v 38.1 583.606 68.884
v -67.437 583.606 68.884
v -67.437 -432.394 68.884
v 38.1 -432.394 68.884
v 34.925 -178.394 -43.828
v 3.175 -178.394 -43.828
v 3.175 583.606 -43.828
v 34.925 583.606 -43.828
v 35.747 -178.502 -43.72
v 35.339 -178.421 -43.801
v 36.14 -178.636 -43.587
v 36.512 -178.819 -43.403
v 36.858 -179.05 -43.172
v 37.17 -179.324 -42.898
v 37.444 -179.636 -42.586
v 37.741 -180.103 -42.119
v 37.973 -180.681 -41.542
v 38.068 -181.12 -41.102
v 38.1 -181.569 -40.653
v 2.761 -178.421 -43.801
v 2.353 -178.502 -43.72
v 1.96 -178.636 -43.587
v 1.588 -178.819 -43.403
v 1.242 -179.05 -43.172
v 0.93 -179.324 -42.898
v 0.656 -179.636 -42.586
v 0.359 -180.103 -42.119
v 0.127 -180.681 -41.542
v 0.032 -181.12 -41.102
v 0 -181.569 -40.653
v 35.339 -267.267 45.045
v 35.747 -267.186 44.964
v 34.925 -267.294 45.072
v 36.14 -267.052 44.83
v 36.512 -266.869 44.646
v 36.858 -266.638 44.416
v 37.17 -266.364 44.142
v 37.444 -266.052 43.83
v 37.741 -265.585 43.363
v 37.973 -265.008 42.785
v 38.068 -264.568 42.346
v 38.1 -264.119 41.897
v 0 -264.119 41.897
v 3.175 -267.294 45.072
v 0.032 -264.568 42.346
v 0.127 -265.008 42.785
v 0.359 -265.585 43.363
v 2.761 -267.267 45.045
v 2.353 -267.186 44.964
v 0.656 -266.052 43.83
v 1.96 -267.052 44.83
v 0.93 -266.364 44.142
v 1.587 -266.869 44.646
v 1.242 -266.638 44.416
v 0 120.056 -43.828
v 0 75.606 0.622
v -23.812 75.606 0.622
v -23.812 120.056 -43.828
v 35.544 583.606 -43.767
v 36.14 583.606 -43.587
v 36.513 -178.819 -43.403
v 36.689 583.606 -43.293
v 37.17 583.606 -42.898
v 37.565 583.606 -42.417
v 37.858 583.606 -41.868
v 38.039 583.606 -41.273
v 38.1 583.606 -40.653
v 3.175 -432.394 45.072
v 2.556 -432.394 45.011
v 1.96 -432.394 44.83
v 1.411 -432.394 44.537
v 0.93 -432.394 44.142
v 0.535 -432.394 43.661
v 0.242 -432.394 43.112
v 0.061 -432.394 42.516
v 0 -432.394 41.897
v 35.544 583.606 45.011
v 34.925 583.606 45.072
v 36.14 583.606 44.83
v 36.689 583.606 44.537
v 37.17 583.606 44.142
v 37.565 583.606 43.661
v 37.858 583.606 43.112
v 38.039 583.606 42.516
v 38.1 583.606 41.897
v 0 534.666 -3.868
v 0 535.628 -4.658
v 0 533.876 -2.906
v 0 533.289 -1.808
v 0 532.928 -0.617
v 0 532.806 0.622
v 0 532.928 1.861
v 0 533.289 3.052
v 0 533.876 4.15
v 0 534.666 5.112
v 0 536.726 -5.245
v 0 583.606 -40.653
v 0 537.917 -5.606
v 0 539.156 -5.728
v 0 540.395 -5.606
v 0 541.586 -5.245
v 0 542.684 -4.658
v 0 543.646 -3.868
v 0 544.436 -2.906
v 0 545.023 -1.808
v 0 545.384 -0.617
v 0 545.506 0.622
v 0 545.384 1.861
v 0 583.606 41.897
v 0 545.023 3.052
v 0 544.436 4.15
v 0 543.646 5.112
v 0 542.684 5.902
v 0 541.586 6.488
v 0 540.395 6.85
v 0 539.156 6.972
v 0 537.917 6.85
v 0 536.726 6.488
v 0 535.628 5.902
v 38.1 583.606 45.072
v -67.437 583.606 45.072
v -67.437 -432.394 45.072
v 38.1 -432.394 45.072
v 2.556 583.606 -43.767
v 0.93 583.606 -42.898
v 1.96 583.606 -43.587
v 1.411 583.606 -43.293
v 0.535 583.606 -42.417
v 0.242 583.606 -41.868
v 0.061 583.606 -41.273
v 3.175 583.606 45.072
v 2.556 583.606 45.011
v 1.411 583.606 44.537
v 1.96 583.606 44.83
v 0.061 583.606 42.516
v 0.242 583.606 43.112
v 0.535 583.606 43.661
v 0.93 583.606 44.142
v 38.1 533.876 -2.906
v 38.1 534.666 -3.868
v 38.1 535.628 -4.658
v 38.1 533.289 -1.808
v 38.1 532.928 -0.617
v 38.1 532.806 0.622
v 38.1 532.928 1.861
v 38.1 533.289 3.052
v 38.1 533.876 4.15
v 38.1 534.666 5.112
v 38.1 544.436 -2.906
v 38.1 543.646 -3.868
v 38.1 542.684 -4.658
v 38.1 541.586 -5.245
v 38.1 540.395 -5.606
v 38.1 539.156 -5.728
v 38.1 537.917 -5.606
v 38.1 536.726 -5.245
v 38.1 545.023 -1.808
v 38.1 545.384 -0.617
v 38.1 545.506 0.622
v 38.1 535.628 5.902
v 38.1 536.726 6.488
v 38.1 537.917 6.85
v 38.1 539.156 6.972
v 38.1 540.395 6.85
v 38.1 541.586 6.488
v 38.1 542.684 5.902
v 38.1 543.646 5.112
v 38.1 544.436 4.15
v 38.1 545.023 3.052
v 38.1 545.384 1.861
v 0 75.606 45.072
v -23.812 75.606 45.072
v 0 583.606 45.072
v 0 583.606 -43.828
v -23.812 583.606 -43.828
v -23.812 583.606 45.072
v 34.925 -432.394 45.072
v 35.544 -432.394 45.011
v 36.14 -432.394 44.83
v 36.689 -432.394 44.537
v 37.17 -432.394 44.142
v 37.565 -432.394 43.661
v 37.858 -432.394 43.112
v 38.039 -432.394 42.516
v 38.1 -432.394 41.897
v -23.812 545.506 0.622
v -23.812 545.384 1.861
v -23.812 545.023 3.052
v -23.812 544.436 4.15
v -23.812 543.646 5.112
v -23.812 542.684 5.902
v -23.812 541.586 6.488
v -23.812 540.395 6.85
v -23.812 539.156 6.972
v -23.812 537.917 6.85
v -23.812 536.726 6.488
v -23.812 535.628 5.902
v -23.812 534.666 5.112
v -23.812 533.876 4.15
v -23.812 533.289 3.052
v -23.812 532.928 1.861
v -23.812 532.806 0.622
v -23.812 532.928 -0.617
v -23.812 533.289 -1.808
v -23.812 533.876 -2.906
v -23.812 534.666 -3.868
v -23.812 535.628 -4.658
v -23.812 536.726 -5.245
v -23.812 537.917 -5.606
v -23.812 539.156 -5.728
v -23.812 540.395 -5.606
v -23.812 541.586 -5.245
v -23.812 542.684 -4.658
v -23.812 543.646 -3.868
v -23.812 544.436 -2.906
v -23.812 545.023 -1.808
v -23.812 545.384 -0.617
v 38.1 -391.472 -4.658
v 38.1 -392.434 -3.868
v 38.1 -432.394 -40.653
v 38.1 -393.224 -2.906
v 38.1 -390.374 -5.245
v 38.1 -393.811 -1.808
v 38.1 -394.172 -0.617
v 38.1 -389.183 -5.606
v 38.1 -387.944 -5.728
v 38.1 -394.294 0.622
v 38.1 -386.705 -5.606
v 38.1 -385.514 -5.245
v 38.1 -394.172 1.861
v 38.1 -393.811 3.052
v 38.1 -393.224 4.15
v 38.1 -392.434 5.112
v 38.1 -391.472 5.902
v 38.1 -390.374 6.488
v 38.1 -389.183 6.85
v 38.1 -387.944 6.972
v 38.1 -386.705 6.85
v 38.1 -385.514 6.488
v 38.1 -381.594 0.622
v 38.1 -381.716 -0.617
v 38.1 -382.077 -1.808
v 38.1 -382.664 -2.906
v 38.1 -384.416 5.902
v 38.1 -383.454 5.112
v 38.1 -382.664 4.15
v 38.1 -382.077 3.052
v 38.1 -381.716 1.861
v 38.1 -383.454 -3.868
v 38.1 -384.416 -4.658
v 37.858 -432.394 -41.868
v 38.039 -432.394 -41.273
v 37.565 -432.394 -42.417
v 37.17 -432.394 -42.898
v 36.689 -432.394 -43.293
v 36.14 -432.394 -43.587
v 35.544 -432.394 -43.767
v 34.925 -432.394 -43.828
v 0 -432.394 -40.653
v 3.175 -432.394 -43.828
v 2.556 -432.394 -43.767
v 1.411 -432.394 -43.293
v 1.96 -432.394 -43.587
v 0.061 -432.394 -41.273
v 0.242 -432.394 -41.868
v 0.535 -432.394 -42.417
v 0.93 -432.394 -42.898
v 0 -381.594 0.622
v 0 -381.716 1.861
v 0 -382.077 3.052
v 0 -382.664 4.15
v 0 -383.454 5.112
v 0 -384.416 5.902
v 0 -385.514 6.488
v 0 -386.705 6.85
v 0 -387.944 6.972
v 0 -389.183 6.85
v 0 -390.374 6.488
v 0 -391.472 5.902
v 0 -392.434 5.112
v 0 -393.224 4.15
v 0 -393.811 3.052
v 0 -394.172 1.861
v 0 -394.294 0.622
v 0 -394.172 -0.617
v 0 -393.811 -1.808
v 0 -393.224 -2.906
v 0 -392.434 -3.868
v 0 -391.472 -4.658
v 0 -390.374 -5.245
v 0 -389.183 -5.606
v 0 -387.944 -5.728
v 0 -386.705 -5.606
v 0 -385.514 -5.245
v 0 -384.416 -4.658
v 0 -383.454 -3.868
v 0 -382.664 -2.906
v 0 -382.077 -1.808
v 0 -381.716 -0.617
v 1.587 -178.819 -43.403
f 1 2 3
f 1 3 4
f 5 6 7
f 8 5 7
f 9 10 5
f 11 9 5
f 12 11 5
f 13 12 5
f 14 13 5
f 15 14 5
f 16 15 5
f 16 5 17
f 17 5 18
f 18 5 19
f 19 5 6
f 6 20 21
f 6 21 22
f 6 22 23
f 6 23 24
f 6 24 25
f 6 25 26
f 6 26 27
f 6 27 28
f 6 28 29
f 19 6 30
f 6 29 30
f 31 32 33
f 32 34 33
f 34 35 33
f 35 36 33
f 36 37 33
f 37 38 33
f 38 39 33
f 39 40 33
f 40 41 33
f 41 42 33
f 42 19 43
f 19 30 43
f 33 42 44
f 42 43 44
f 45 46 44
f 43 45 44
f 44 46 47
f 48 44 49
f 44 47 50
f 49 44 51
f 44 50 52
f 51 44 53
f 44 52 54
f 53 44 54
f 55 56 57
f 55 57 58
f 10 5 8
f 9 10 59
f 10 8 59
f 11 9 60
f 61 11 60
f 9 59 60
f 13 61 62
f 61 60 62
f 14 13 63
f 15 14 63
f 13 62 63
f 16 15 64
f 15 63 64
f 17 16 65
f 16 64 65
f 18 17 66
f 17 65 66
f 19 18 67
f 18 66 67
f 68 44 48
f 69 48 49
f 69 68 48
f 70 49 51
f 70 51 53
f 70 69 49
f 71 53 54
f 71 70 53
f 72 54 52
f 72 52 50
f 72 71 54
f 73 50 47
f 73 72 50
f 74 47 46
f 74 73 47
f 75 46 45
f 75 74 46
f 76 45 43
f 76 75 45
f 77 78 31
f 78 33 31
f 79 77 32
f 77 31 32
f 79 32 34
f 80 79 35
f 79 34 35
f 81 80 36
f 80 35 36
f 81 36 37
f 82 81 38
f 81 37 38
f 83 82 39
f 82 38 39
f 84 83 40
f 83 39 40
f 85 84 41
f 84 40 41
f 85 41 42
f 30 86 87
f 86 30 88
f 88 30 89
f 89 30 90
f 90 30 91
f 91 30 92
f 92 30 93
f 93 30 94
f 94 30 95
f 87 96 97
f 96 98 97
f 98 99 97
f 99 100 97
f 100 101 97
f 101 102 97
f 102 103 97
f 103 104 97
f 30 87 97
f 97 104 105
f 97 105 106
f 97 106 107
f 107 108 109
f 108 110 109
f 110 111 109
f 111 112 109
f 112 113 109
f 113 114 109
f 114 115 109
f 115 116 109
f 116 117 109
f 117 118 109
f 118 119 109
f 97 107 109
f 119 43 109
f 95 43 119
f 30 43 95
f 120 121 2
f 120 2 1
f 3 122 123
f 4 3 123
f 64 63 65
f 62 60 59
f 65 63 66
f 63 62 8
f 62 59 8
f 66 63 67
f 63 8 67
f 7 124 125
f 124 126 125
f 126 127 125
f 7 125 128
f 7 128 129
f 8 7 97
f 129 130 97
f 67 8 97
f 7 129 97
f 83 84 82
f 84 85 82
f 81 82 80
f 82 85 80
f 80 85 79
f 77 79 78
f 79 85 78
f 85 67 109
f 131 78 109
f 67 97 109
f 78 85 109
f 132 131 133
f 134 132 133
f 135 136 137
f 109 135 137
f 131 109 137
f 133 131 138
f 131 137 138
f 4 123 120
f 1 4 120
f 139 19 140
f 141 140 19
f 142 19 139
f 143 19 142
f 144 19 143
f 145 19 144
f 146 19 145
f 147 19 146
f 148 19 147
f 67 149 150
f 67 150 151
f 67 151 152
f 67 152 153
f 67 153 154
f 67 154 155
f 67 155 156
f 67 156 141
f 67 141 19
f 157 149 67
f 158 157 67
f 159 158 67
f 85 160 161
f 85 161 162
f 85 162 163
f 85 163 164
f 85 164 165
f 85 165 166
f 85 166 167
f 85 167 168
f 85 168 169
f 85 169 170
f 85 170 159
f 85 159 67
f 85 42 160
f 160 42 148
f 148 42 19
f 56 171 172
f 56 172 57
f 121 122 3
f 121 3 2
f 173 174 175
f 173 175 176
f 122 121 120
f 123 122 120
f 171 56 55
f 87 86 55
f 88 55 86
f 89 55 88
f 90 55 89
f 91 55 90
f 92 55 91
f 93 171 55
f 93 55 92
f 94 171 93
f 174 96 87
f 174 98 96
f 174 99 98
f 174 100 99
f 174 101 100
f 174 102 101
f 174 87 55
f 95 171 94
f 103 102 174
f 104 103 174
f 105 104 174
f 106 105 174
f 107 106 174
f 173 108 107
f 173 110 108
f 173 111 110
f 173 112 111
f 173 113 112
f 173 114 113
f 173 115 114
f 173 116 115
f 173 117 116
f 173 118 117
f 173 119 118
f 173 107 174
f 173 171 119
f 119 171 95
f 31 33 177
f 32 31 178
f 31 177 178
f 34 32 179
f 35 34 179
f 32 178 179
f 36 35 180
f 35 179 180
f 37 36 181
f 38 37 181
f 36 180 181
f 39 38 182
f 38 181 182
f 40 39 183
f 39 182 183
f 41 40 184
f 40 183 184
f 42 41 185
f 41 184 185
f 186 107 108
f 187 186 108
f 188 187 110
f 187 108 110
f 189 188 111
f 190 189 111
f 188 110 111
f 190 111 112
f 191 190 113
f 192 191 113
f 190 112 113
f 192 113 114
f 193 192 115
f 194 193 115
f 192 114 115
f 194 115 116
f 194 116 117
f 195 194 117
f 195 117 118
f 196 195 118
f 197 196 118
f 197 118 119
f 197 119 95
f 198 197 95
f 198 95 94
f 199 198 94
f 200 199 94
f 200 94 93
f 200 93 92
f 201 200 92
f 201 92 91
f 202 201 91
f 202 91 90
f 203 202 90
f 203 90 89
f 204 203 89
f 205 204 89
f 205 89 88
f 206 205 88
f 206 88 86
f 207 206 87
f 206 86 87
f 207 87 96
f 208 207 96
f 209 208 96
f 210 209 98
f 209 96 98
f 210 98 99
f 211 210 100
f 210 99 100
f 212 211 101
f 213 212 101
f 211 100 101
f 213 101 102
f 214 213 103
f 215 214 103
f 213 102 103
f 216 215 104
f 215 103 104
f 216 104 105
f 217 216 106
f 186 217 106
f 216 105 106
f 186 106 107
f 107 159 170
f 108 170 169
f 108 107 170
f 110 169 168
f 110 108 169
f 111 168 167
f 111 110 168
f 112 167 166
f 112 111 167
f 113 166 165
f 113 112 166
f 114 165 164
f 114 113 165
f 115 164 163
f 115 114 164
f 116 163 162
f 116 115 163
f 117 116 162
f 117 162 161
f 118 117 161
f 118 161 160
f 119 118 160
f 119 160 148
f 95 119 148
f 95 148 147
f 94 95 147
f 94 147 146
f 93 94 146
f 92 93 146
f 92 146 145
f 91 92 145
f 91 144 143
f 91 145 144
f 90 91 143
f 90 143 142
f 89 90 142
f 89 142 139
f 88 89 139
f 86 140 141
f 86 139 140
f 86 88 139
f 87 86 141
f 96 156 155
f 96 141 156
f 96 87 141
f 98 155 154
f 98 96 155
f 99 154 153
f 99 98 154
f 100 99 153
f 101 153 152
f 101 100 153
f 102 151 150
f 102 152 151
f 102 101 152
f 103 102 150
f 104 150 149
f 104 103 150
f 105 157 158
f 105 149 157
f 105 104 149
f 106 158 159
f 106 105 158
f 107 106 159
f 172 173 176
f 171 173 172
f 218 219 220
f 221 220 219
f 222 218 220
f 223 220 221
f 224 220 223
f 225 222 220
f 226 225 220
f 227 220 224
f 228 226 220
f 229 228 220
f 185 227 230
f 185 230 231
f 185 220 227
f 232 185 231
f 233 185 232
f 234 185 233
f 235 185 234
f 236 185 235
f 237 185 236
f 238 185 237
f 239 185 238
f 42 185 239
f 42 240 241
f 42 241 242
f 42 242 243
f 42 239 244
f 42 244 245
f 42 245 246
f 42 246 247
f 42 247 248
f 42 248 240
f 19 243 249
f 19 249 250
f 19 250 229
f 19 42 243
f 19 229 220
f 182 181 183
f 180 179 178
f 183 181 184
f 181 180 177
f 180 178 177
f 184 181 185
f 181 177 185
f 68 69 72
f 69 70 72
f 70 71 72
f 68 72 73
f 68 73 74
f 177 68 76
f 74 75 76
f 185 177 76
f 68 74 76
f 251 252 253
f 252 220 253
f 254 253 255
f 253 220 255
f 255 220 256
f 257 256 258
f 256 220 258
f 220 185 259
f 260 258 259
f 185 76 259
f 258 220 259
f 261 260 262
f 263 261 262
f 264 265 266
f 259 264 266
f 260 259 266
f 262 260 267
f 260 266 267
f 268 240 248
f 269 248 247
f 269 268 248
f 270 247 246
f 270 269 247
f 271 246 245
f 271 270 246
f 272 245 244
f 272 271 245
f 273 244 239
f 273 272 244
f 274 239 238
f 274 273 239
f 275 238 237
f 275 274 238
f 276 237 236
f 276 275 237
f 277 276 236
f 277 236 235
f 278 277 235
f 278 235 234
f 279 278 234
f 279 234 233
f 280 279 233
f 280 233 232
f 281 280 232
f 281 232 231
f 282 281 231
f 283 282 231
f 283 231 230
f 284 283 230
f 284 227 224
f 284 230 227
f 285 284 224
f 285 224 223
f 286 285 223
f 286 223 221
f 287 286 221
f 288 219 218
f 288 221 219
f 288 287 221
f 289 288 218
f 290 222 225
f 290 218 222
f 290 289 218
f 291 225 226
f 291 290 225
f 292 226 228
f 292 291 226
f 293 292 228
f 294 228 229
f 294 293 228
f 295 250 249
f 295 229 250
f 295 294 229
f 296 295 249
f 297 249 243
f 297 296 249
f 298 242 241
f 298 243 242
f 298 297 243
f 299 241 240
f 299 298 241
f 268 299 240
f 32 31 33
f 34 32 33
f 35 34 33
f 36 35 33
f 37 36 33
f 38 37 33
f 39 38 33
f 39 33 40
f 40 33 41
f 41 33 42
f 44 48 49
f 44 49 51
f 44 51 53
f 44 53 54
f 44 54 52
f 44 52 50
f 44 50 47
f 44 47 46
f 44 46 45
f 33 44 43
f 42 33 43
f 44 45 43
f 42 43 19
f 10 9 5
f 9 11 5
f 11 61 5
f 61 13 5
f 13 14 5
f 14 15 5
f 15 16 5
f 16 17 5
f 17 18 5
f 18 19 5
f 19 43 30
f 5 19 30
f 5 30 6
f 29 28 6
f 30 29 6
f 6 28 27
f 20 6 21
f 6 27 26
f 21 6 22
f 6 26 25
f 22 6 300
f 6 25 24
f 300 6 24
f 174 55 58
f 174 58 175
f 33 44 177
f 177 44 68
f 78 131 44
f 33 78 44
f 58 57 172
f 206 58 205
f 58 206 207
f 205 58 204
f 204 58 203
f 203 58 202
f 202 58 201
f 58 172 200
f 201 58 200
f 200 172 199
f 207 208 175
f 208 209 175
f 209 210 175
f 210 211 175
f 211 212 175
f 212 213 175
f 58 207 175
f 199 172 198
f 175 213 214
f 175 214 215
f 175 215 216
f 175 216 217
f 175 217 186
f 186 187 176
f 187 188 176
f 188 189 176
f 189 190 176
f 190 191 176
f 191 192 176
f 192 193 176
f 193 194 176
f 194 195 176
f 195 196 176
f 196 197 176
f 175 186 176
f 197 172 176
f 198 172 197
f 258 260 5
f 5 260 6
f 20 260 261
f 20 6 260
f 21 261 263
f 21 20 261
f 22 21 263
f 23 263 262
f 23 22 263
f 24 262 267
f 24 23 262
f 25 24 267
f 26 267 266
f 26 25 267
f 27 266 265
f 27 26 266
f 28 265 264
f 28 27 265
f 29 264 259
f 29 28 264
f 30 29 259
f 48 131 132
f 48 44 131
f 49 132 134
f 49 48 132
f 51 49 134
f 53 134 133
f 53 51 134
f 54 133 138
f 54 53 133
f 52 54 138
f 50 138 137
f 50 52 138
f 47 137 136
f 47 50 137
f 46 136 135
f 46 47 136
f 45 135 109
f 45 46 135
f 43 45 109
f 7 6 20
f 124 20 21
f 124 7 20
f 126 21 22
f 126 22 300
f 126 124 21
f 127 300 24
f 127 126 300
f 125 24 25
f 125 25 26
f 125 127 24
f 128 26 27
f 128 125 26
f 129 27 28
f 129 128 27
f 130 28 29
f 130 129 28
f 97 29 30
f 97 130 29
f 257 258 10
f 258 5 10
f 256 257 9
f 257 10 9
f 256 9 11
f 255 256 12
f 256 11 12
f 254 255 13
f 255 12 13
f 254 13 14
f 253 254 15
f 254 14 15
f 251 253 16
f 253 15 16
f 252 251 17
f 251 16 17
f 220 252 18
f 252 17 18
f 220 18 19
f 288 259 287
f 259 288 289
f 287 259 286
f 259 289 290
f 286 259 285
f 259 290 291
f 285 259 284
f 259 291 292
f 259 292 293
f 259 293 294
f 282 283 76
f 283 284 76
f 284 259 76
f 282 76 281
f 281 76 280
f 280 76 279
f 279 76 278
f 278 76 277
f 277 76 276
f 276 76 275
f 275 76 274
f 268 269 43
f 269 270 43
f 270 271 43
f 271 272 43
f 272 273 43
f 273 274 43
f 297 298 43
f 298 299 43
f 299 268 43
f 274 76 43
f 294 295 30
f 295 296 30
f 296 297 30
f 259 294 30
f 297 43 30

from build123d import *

# Parameters (mm, degrees)
F1_DEPTH       = 38.1
F2_R           = 3.175
F4_DEPTH       = 38.1
F5_R           = 3.175
F7_DEPTH       = 23.8125
F9_W           = 105.537
F9_H           = 1016
F10_DEPTH      = 23.8125
F11_R          = 6.35
F12_DEPTH      = 67.438
F12_DEPTH_BACK = 38.101


with BuildPart() as f1:
    # F0 (on Right) → F1 (new body)
    with BuildSketch(Plane.YZ):
        Polygon((583.6059013654, 45.071807631), (-267.2940986346, 45.071807631), (-178.3940986346, -43.828192369), (583.6059013654, -43.828192369), align=None)
    extrude(amount=F1_DEPTH)

    # F2
    f2_edges = [f1.edges().sort_by_distance(p)[0] for p in [
        (38.1, 158.155901, 45.071808),
        (0, 158.155901, 45.071808),
        (38.1, 202.605901, -43.828192),
        (0, 202.605901, -43.828192),
    ]]
    fillet(f2_edges, radius=F2_R)


with BuildPart() as f4:
    # F3 (on Right) → F4 (new body)
    with BuildSketch(Plane.YZ):
        Polygon((-432.3940986346, -43.828192369), (-178.3940986346, -43.828192369), (-267.2940986346, 45.071807631), (-432.3940986346, 45.071807631), align=None)
    extrude(amount=F4_DEPTH)

    # F5
    f5_edges = [f4.edges().sort_by_distance(p)[0] for p in [
        (38.1, -349.844099, 45.071808),
        (0, -349.844099, 45.071808),
        (38.1, -305.394099, -43.828192),
        (0, -305.394099, -43.828192),
    ]]
    fillet(f5_edges, radius=F5_R)


with BuildPart() as f7:
    # F6 (on Right) → F7 (new body)
    with BuildSketch(Plane.YZ):
        Polygon((583.6059013654, -43.828192369), (583.6059013654, 45.071807631), (75.6059013654, 45.071807631), (75.6059013654, 0.621807631), (120.0559013654, -43.828192369), align=None)
    extrude(amount=-F7_DEPTH)


with BuildPart() as f10:
    # F9 (on offset) → F10 (new body)
    with BuildSketch(Plane.XY.offset(45.071807631)):
        with Locations((-14.6685, 75.6059013654)):
            Rectangle(F9_W, F9_H)
    extrude(amount=F10_DEPTH)


with BuildPart() as f12_tool:
    # F11 (on Right) → F12 (new body, two sides)
    with BuildSketch(Plane.YZ) as f12_sk:
        with Locations((-387.9440986346, 0.621807631)):
            Circle(F11_R)
        with Locations((539.1559013654, 0.621807631)):
            Circle(F11_R)
    extrude(amount=-F12_DEPTH)
    extrude(f12_sk.sketch, amount=F12_DEPTH_BACK)


with BuildPart() as f1_1:
    add(f1.part)

    # F12: cut by f12_tool
    add(f12_tool.part, mode=Mode.SUBTRACT)


with BuildPart() as f4_1:
    add(f4.part)

    # F12: cut by f12_tool
    add(f12_tool.part, mode=Mode.SUBTRACT)


with BuildPart() as f7_1:
    add(f7.part)

    # F12: cut by f12_tool
    add(f12_tool.part, mode=Mode.SUBTRACT)


solid = Compound([f10.part, f1_1.part, f4_1.part, f7_1.part])
